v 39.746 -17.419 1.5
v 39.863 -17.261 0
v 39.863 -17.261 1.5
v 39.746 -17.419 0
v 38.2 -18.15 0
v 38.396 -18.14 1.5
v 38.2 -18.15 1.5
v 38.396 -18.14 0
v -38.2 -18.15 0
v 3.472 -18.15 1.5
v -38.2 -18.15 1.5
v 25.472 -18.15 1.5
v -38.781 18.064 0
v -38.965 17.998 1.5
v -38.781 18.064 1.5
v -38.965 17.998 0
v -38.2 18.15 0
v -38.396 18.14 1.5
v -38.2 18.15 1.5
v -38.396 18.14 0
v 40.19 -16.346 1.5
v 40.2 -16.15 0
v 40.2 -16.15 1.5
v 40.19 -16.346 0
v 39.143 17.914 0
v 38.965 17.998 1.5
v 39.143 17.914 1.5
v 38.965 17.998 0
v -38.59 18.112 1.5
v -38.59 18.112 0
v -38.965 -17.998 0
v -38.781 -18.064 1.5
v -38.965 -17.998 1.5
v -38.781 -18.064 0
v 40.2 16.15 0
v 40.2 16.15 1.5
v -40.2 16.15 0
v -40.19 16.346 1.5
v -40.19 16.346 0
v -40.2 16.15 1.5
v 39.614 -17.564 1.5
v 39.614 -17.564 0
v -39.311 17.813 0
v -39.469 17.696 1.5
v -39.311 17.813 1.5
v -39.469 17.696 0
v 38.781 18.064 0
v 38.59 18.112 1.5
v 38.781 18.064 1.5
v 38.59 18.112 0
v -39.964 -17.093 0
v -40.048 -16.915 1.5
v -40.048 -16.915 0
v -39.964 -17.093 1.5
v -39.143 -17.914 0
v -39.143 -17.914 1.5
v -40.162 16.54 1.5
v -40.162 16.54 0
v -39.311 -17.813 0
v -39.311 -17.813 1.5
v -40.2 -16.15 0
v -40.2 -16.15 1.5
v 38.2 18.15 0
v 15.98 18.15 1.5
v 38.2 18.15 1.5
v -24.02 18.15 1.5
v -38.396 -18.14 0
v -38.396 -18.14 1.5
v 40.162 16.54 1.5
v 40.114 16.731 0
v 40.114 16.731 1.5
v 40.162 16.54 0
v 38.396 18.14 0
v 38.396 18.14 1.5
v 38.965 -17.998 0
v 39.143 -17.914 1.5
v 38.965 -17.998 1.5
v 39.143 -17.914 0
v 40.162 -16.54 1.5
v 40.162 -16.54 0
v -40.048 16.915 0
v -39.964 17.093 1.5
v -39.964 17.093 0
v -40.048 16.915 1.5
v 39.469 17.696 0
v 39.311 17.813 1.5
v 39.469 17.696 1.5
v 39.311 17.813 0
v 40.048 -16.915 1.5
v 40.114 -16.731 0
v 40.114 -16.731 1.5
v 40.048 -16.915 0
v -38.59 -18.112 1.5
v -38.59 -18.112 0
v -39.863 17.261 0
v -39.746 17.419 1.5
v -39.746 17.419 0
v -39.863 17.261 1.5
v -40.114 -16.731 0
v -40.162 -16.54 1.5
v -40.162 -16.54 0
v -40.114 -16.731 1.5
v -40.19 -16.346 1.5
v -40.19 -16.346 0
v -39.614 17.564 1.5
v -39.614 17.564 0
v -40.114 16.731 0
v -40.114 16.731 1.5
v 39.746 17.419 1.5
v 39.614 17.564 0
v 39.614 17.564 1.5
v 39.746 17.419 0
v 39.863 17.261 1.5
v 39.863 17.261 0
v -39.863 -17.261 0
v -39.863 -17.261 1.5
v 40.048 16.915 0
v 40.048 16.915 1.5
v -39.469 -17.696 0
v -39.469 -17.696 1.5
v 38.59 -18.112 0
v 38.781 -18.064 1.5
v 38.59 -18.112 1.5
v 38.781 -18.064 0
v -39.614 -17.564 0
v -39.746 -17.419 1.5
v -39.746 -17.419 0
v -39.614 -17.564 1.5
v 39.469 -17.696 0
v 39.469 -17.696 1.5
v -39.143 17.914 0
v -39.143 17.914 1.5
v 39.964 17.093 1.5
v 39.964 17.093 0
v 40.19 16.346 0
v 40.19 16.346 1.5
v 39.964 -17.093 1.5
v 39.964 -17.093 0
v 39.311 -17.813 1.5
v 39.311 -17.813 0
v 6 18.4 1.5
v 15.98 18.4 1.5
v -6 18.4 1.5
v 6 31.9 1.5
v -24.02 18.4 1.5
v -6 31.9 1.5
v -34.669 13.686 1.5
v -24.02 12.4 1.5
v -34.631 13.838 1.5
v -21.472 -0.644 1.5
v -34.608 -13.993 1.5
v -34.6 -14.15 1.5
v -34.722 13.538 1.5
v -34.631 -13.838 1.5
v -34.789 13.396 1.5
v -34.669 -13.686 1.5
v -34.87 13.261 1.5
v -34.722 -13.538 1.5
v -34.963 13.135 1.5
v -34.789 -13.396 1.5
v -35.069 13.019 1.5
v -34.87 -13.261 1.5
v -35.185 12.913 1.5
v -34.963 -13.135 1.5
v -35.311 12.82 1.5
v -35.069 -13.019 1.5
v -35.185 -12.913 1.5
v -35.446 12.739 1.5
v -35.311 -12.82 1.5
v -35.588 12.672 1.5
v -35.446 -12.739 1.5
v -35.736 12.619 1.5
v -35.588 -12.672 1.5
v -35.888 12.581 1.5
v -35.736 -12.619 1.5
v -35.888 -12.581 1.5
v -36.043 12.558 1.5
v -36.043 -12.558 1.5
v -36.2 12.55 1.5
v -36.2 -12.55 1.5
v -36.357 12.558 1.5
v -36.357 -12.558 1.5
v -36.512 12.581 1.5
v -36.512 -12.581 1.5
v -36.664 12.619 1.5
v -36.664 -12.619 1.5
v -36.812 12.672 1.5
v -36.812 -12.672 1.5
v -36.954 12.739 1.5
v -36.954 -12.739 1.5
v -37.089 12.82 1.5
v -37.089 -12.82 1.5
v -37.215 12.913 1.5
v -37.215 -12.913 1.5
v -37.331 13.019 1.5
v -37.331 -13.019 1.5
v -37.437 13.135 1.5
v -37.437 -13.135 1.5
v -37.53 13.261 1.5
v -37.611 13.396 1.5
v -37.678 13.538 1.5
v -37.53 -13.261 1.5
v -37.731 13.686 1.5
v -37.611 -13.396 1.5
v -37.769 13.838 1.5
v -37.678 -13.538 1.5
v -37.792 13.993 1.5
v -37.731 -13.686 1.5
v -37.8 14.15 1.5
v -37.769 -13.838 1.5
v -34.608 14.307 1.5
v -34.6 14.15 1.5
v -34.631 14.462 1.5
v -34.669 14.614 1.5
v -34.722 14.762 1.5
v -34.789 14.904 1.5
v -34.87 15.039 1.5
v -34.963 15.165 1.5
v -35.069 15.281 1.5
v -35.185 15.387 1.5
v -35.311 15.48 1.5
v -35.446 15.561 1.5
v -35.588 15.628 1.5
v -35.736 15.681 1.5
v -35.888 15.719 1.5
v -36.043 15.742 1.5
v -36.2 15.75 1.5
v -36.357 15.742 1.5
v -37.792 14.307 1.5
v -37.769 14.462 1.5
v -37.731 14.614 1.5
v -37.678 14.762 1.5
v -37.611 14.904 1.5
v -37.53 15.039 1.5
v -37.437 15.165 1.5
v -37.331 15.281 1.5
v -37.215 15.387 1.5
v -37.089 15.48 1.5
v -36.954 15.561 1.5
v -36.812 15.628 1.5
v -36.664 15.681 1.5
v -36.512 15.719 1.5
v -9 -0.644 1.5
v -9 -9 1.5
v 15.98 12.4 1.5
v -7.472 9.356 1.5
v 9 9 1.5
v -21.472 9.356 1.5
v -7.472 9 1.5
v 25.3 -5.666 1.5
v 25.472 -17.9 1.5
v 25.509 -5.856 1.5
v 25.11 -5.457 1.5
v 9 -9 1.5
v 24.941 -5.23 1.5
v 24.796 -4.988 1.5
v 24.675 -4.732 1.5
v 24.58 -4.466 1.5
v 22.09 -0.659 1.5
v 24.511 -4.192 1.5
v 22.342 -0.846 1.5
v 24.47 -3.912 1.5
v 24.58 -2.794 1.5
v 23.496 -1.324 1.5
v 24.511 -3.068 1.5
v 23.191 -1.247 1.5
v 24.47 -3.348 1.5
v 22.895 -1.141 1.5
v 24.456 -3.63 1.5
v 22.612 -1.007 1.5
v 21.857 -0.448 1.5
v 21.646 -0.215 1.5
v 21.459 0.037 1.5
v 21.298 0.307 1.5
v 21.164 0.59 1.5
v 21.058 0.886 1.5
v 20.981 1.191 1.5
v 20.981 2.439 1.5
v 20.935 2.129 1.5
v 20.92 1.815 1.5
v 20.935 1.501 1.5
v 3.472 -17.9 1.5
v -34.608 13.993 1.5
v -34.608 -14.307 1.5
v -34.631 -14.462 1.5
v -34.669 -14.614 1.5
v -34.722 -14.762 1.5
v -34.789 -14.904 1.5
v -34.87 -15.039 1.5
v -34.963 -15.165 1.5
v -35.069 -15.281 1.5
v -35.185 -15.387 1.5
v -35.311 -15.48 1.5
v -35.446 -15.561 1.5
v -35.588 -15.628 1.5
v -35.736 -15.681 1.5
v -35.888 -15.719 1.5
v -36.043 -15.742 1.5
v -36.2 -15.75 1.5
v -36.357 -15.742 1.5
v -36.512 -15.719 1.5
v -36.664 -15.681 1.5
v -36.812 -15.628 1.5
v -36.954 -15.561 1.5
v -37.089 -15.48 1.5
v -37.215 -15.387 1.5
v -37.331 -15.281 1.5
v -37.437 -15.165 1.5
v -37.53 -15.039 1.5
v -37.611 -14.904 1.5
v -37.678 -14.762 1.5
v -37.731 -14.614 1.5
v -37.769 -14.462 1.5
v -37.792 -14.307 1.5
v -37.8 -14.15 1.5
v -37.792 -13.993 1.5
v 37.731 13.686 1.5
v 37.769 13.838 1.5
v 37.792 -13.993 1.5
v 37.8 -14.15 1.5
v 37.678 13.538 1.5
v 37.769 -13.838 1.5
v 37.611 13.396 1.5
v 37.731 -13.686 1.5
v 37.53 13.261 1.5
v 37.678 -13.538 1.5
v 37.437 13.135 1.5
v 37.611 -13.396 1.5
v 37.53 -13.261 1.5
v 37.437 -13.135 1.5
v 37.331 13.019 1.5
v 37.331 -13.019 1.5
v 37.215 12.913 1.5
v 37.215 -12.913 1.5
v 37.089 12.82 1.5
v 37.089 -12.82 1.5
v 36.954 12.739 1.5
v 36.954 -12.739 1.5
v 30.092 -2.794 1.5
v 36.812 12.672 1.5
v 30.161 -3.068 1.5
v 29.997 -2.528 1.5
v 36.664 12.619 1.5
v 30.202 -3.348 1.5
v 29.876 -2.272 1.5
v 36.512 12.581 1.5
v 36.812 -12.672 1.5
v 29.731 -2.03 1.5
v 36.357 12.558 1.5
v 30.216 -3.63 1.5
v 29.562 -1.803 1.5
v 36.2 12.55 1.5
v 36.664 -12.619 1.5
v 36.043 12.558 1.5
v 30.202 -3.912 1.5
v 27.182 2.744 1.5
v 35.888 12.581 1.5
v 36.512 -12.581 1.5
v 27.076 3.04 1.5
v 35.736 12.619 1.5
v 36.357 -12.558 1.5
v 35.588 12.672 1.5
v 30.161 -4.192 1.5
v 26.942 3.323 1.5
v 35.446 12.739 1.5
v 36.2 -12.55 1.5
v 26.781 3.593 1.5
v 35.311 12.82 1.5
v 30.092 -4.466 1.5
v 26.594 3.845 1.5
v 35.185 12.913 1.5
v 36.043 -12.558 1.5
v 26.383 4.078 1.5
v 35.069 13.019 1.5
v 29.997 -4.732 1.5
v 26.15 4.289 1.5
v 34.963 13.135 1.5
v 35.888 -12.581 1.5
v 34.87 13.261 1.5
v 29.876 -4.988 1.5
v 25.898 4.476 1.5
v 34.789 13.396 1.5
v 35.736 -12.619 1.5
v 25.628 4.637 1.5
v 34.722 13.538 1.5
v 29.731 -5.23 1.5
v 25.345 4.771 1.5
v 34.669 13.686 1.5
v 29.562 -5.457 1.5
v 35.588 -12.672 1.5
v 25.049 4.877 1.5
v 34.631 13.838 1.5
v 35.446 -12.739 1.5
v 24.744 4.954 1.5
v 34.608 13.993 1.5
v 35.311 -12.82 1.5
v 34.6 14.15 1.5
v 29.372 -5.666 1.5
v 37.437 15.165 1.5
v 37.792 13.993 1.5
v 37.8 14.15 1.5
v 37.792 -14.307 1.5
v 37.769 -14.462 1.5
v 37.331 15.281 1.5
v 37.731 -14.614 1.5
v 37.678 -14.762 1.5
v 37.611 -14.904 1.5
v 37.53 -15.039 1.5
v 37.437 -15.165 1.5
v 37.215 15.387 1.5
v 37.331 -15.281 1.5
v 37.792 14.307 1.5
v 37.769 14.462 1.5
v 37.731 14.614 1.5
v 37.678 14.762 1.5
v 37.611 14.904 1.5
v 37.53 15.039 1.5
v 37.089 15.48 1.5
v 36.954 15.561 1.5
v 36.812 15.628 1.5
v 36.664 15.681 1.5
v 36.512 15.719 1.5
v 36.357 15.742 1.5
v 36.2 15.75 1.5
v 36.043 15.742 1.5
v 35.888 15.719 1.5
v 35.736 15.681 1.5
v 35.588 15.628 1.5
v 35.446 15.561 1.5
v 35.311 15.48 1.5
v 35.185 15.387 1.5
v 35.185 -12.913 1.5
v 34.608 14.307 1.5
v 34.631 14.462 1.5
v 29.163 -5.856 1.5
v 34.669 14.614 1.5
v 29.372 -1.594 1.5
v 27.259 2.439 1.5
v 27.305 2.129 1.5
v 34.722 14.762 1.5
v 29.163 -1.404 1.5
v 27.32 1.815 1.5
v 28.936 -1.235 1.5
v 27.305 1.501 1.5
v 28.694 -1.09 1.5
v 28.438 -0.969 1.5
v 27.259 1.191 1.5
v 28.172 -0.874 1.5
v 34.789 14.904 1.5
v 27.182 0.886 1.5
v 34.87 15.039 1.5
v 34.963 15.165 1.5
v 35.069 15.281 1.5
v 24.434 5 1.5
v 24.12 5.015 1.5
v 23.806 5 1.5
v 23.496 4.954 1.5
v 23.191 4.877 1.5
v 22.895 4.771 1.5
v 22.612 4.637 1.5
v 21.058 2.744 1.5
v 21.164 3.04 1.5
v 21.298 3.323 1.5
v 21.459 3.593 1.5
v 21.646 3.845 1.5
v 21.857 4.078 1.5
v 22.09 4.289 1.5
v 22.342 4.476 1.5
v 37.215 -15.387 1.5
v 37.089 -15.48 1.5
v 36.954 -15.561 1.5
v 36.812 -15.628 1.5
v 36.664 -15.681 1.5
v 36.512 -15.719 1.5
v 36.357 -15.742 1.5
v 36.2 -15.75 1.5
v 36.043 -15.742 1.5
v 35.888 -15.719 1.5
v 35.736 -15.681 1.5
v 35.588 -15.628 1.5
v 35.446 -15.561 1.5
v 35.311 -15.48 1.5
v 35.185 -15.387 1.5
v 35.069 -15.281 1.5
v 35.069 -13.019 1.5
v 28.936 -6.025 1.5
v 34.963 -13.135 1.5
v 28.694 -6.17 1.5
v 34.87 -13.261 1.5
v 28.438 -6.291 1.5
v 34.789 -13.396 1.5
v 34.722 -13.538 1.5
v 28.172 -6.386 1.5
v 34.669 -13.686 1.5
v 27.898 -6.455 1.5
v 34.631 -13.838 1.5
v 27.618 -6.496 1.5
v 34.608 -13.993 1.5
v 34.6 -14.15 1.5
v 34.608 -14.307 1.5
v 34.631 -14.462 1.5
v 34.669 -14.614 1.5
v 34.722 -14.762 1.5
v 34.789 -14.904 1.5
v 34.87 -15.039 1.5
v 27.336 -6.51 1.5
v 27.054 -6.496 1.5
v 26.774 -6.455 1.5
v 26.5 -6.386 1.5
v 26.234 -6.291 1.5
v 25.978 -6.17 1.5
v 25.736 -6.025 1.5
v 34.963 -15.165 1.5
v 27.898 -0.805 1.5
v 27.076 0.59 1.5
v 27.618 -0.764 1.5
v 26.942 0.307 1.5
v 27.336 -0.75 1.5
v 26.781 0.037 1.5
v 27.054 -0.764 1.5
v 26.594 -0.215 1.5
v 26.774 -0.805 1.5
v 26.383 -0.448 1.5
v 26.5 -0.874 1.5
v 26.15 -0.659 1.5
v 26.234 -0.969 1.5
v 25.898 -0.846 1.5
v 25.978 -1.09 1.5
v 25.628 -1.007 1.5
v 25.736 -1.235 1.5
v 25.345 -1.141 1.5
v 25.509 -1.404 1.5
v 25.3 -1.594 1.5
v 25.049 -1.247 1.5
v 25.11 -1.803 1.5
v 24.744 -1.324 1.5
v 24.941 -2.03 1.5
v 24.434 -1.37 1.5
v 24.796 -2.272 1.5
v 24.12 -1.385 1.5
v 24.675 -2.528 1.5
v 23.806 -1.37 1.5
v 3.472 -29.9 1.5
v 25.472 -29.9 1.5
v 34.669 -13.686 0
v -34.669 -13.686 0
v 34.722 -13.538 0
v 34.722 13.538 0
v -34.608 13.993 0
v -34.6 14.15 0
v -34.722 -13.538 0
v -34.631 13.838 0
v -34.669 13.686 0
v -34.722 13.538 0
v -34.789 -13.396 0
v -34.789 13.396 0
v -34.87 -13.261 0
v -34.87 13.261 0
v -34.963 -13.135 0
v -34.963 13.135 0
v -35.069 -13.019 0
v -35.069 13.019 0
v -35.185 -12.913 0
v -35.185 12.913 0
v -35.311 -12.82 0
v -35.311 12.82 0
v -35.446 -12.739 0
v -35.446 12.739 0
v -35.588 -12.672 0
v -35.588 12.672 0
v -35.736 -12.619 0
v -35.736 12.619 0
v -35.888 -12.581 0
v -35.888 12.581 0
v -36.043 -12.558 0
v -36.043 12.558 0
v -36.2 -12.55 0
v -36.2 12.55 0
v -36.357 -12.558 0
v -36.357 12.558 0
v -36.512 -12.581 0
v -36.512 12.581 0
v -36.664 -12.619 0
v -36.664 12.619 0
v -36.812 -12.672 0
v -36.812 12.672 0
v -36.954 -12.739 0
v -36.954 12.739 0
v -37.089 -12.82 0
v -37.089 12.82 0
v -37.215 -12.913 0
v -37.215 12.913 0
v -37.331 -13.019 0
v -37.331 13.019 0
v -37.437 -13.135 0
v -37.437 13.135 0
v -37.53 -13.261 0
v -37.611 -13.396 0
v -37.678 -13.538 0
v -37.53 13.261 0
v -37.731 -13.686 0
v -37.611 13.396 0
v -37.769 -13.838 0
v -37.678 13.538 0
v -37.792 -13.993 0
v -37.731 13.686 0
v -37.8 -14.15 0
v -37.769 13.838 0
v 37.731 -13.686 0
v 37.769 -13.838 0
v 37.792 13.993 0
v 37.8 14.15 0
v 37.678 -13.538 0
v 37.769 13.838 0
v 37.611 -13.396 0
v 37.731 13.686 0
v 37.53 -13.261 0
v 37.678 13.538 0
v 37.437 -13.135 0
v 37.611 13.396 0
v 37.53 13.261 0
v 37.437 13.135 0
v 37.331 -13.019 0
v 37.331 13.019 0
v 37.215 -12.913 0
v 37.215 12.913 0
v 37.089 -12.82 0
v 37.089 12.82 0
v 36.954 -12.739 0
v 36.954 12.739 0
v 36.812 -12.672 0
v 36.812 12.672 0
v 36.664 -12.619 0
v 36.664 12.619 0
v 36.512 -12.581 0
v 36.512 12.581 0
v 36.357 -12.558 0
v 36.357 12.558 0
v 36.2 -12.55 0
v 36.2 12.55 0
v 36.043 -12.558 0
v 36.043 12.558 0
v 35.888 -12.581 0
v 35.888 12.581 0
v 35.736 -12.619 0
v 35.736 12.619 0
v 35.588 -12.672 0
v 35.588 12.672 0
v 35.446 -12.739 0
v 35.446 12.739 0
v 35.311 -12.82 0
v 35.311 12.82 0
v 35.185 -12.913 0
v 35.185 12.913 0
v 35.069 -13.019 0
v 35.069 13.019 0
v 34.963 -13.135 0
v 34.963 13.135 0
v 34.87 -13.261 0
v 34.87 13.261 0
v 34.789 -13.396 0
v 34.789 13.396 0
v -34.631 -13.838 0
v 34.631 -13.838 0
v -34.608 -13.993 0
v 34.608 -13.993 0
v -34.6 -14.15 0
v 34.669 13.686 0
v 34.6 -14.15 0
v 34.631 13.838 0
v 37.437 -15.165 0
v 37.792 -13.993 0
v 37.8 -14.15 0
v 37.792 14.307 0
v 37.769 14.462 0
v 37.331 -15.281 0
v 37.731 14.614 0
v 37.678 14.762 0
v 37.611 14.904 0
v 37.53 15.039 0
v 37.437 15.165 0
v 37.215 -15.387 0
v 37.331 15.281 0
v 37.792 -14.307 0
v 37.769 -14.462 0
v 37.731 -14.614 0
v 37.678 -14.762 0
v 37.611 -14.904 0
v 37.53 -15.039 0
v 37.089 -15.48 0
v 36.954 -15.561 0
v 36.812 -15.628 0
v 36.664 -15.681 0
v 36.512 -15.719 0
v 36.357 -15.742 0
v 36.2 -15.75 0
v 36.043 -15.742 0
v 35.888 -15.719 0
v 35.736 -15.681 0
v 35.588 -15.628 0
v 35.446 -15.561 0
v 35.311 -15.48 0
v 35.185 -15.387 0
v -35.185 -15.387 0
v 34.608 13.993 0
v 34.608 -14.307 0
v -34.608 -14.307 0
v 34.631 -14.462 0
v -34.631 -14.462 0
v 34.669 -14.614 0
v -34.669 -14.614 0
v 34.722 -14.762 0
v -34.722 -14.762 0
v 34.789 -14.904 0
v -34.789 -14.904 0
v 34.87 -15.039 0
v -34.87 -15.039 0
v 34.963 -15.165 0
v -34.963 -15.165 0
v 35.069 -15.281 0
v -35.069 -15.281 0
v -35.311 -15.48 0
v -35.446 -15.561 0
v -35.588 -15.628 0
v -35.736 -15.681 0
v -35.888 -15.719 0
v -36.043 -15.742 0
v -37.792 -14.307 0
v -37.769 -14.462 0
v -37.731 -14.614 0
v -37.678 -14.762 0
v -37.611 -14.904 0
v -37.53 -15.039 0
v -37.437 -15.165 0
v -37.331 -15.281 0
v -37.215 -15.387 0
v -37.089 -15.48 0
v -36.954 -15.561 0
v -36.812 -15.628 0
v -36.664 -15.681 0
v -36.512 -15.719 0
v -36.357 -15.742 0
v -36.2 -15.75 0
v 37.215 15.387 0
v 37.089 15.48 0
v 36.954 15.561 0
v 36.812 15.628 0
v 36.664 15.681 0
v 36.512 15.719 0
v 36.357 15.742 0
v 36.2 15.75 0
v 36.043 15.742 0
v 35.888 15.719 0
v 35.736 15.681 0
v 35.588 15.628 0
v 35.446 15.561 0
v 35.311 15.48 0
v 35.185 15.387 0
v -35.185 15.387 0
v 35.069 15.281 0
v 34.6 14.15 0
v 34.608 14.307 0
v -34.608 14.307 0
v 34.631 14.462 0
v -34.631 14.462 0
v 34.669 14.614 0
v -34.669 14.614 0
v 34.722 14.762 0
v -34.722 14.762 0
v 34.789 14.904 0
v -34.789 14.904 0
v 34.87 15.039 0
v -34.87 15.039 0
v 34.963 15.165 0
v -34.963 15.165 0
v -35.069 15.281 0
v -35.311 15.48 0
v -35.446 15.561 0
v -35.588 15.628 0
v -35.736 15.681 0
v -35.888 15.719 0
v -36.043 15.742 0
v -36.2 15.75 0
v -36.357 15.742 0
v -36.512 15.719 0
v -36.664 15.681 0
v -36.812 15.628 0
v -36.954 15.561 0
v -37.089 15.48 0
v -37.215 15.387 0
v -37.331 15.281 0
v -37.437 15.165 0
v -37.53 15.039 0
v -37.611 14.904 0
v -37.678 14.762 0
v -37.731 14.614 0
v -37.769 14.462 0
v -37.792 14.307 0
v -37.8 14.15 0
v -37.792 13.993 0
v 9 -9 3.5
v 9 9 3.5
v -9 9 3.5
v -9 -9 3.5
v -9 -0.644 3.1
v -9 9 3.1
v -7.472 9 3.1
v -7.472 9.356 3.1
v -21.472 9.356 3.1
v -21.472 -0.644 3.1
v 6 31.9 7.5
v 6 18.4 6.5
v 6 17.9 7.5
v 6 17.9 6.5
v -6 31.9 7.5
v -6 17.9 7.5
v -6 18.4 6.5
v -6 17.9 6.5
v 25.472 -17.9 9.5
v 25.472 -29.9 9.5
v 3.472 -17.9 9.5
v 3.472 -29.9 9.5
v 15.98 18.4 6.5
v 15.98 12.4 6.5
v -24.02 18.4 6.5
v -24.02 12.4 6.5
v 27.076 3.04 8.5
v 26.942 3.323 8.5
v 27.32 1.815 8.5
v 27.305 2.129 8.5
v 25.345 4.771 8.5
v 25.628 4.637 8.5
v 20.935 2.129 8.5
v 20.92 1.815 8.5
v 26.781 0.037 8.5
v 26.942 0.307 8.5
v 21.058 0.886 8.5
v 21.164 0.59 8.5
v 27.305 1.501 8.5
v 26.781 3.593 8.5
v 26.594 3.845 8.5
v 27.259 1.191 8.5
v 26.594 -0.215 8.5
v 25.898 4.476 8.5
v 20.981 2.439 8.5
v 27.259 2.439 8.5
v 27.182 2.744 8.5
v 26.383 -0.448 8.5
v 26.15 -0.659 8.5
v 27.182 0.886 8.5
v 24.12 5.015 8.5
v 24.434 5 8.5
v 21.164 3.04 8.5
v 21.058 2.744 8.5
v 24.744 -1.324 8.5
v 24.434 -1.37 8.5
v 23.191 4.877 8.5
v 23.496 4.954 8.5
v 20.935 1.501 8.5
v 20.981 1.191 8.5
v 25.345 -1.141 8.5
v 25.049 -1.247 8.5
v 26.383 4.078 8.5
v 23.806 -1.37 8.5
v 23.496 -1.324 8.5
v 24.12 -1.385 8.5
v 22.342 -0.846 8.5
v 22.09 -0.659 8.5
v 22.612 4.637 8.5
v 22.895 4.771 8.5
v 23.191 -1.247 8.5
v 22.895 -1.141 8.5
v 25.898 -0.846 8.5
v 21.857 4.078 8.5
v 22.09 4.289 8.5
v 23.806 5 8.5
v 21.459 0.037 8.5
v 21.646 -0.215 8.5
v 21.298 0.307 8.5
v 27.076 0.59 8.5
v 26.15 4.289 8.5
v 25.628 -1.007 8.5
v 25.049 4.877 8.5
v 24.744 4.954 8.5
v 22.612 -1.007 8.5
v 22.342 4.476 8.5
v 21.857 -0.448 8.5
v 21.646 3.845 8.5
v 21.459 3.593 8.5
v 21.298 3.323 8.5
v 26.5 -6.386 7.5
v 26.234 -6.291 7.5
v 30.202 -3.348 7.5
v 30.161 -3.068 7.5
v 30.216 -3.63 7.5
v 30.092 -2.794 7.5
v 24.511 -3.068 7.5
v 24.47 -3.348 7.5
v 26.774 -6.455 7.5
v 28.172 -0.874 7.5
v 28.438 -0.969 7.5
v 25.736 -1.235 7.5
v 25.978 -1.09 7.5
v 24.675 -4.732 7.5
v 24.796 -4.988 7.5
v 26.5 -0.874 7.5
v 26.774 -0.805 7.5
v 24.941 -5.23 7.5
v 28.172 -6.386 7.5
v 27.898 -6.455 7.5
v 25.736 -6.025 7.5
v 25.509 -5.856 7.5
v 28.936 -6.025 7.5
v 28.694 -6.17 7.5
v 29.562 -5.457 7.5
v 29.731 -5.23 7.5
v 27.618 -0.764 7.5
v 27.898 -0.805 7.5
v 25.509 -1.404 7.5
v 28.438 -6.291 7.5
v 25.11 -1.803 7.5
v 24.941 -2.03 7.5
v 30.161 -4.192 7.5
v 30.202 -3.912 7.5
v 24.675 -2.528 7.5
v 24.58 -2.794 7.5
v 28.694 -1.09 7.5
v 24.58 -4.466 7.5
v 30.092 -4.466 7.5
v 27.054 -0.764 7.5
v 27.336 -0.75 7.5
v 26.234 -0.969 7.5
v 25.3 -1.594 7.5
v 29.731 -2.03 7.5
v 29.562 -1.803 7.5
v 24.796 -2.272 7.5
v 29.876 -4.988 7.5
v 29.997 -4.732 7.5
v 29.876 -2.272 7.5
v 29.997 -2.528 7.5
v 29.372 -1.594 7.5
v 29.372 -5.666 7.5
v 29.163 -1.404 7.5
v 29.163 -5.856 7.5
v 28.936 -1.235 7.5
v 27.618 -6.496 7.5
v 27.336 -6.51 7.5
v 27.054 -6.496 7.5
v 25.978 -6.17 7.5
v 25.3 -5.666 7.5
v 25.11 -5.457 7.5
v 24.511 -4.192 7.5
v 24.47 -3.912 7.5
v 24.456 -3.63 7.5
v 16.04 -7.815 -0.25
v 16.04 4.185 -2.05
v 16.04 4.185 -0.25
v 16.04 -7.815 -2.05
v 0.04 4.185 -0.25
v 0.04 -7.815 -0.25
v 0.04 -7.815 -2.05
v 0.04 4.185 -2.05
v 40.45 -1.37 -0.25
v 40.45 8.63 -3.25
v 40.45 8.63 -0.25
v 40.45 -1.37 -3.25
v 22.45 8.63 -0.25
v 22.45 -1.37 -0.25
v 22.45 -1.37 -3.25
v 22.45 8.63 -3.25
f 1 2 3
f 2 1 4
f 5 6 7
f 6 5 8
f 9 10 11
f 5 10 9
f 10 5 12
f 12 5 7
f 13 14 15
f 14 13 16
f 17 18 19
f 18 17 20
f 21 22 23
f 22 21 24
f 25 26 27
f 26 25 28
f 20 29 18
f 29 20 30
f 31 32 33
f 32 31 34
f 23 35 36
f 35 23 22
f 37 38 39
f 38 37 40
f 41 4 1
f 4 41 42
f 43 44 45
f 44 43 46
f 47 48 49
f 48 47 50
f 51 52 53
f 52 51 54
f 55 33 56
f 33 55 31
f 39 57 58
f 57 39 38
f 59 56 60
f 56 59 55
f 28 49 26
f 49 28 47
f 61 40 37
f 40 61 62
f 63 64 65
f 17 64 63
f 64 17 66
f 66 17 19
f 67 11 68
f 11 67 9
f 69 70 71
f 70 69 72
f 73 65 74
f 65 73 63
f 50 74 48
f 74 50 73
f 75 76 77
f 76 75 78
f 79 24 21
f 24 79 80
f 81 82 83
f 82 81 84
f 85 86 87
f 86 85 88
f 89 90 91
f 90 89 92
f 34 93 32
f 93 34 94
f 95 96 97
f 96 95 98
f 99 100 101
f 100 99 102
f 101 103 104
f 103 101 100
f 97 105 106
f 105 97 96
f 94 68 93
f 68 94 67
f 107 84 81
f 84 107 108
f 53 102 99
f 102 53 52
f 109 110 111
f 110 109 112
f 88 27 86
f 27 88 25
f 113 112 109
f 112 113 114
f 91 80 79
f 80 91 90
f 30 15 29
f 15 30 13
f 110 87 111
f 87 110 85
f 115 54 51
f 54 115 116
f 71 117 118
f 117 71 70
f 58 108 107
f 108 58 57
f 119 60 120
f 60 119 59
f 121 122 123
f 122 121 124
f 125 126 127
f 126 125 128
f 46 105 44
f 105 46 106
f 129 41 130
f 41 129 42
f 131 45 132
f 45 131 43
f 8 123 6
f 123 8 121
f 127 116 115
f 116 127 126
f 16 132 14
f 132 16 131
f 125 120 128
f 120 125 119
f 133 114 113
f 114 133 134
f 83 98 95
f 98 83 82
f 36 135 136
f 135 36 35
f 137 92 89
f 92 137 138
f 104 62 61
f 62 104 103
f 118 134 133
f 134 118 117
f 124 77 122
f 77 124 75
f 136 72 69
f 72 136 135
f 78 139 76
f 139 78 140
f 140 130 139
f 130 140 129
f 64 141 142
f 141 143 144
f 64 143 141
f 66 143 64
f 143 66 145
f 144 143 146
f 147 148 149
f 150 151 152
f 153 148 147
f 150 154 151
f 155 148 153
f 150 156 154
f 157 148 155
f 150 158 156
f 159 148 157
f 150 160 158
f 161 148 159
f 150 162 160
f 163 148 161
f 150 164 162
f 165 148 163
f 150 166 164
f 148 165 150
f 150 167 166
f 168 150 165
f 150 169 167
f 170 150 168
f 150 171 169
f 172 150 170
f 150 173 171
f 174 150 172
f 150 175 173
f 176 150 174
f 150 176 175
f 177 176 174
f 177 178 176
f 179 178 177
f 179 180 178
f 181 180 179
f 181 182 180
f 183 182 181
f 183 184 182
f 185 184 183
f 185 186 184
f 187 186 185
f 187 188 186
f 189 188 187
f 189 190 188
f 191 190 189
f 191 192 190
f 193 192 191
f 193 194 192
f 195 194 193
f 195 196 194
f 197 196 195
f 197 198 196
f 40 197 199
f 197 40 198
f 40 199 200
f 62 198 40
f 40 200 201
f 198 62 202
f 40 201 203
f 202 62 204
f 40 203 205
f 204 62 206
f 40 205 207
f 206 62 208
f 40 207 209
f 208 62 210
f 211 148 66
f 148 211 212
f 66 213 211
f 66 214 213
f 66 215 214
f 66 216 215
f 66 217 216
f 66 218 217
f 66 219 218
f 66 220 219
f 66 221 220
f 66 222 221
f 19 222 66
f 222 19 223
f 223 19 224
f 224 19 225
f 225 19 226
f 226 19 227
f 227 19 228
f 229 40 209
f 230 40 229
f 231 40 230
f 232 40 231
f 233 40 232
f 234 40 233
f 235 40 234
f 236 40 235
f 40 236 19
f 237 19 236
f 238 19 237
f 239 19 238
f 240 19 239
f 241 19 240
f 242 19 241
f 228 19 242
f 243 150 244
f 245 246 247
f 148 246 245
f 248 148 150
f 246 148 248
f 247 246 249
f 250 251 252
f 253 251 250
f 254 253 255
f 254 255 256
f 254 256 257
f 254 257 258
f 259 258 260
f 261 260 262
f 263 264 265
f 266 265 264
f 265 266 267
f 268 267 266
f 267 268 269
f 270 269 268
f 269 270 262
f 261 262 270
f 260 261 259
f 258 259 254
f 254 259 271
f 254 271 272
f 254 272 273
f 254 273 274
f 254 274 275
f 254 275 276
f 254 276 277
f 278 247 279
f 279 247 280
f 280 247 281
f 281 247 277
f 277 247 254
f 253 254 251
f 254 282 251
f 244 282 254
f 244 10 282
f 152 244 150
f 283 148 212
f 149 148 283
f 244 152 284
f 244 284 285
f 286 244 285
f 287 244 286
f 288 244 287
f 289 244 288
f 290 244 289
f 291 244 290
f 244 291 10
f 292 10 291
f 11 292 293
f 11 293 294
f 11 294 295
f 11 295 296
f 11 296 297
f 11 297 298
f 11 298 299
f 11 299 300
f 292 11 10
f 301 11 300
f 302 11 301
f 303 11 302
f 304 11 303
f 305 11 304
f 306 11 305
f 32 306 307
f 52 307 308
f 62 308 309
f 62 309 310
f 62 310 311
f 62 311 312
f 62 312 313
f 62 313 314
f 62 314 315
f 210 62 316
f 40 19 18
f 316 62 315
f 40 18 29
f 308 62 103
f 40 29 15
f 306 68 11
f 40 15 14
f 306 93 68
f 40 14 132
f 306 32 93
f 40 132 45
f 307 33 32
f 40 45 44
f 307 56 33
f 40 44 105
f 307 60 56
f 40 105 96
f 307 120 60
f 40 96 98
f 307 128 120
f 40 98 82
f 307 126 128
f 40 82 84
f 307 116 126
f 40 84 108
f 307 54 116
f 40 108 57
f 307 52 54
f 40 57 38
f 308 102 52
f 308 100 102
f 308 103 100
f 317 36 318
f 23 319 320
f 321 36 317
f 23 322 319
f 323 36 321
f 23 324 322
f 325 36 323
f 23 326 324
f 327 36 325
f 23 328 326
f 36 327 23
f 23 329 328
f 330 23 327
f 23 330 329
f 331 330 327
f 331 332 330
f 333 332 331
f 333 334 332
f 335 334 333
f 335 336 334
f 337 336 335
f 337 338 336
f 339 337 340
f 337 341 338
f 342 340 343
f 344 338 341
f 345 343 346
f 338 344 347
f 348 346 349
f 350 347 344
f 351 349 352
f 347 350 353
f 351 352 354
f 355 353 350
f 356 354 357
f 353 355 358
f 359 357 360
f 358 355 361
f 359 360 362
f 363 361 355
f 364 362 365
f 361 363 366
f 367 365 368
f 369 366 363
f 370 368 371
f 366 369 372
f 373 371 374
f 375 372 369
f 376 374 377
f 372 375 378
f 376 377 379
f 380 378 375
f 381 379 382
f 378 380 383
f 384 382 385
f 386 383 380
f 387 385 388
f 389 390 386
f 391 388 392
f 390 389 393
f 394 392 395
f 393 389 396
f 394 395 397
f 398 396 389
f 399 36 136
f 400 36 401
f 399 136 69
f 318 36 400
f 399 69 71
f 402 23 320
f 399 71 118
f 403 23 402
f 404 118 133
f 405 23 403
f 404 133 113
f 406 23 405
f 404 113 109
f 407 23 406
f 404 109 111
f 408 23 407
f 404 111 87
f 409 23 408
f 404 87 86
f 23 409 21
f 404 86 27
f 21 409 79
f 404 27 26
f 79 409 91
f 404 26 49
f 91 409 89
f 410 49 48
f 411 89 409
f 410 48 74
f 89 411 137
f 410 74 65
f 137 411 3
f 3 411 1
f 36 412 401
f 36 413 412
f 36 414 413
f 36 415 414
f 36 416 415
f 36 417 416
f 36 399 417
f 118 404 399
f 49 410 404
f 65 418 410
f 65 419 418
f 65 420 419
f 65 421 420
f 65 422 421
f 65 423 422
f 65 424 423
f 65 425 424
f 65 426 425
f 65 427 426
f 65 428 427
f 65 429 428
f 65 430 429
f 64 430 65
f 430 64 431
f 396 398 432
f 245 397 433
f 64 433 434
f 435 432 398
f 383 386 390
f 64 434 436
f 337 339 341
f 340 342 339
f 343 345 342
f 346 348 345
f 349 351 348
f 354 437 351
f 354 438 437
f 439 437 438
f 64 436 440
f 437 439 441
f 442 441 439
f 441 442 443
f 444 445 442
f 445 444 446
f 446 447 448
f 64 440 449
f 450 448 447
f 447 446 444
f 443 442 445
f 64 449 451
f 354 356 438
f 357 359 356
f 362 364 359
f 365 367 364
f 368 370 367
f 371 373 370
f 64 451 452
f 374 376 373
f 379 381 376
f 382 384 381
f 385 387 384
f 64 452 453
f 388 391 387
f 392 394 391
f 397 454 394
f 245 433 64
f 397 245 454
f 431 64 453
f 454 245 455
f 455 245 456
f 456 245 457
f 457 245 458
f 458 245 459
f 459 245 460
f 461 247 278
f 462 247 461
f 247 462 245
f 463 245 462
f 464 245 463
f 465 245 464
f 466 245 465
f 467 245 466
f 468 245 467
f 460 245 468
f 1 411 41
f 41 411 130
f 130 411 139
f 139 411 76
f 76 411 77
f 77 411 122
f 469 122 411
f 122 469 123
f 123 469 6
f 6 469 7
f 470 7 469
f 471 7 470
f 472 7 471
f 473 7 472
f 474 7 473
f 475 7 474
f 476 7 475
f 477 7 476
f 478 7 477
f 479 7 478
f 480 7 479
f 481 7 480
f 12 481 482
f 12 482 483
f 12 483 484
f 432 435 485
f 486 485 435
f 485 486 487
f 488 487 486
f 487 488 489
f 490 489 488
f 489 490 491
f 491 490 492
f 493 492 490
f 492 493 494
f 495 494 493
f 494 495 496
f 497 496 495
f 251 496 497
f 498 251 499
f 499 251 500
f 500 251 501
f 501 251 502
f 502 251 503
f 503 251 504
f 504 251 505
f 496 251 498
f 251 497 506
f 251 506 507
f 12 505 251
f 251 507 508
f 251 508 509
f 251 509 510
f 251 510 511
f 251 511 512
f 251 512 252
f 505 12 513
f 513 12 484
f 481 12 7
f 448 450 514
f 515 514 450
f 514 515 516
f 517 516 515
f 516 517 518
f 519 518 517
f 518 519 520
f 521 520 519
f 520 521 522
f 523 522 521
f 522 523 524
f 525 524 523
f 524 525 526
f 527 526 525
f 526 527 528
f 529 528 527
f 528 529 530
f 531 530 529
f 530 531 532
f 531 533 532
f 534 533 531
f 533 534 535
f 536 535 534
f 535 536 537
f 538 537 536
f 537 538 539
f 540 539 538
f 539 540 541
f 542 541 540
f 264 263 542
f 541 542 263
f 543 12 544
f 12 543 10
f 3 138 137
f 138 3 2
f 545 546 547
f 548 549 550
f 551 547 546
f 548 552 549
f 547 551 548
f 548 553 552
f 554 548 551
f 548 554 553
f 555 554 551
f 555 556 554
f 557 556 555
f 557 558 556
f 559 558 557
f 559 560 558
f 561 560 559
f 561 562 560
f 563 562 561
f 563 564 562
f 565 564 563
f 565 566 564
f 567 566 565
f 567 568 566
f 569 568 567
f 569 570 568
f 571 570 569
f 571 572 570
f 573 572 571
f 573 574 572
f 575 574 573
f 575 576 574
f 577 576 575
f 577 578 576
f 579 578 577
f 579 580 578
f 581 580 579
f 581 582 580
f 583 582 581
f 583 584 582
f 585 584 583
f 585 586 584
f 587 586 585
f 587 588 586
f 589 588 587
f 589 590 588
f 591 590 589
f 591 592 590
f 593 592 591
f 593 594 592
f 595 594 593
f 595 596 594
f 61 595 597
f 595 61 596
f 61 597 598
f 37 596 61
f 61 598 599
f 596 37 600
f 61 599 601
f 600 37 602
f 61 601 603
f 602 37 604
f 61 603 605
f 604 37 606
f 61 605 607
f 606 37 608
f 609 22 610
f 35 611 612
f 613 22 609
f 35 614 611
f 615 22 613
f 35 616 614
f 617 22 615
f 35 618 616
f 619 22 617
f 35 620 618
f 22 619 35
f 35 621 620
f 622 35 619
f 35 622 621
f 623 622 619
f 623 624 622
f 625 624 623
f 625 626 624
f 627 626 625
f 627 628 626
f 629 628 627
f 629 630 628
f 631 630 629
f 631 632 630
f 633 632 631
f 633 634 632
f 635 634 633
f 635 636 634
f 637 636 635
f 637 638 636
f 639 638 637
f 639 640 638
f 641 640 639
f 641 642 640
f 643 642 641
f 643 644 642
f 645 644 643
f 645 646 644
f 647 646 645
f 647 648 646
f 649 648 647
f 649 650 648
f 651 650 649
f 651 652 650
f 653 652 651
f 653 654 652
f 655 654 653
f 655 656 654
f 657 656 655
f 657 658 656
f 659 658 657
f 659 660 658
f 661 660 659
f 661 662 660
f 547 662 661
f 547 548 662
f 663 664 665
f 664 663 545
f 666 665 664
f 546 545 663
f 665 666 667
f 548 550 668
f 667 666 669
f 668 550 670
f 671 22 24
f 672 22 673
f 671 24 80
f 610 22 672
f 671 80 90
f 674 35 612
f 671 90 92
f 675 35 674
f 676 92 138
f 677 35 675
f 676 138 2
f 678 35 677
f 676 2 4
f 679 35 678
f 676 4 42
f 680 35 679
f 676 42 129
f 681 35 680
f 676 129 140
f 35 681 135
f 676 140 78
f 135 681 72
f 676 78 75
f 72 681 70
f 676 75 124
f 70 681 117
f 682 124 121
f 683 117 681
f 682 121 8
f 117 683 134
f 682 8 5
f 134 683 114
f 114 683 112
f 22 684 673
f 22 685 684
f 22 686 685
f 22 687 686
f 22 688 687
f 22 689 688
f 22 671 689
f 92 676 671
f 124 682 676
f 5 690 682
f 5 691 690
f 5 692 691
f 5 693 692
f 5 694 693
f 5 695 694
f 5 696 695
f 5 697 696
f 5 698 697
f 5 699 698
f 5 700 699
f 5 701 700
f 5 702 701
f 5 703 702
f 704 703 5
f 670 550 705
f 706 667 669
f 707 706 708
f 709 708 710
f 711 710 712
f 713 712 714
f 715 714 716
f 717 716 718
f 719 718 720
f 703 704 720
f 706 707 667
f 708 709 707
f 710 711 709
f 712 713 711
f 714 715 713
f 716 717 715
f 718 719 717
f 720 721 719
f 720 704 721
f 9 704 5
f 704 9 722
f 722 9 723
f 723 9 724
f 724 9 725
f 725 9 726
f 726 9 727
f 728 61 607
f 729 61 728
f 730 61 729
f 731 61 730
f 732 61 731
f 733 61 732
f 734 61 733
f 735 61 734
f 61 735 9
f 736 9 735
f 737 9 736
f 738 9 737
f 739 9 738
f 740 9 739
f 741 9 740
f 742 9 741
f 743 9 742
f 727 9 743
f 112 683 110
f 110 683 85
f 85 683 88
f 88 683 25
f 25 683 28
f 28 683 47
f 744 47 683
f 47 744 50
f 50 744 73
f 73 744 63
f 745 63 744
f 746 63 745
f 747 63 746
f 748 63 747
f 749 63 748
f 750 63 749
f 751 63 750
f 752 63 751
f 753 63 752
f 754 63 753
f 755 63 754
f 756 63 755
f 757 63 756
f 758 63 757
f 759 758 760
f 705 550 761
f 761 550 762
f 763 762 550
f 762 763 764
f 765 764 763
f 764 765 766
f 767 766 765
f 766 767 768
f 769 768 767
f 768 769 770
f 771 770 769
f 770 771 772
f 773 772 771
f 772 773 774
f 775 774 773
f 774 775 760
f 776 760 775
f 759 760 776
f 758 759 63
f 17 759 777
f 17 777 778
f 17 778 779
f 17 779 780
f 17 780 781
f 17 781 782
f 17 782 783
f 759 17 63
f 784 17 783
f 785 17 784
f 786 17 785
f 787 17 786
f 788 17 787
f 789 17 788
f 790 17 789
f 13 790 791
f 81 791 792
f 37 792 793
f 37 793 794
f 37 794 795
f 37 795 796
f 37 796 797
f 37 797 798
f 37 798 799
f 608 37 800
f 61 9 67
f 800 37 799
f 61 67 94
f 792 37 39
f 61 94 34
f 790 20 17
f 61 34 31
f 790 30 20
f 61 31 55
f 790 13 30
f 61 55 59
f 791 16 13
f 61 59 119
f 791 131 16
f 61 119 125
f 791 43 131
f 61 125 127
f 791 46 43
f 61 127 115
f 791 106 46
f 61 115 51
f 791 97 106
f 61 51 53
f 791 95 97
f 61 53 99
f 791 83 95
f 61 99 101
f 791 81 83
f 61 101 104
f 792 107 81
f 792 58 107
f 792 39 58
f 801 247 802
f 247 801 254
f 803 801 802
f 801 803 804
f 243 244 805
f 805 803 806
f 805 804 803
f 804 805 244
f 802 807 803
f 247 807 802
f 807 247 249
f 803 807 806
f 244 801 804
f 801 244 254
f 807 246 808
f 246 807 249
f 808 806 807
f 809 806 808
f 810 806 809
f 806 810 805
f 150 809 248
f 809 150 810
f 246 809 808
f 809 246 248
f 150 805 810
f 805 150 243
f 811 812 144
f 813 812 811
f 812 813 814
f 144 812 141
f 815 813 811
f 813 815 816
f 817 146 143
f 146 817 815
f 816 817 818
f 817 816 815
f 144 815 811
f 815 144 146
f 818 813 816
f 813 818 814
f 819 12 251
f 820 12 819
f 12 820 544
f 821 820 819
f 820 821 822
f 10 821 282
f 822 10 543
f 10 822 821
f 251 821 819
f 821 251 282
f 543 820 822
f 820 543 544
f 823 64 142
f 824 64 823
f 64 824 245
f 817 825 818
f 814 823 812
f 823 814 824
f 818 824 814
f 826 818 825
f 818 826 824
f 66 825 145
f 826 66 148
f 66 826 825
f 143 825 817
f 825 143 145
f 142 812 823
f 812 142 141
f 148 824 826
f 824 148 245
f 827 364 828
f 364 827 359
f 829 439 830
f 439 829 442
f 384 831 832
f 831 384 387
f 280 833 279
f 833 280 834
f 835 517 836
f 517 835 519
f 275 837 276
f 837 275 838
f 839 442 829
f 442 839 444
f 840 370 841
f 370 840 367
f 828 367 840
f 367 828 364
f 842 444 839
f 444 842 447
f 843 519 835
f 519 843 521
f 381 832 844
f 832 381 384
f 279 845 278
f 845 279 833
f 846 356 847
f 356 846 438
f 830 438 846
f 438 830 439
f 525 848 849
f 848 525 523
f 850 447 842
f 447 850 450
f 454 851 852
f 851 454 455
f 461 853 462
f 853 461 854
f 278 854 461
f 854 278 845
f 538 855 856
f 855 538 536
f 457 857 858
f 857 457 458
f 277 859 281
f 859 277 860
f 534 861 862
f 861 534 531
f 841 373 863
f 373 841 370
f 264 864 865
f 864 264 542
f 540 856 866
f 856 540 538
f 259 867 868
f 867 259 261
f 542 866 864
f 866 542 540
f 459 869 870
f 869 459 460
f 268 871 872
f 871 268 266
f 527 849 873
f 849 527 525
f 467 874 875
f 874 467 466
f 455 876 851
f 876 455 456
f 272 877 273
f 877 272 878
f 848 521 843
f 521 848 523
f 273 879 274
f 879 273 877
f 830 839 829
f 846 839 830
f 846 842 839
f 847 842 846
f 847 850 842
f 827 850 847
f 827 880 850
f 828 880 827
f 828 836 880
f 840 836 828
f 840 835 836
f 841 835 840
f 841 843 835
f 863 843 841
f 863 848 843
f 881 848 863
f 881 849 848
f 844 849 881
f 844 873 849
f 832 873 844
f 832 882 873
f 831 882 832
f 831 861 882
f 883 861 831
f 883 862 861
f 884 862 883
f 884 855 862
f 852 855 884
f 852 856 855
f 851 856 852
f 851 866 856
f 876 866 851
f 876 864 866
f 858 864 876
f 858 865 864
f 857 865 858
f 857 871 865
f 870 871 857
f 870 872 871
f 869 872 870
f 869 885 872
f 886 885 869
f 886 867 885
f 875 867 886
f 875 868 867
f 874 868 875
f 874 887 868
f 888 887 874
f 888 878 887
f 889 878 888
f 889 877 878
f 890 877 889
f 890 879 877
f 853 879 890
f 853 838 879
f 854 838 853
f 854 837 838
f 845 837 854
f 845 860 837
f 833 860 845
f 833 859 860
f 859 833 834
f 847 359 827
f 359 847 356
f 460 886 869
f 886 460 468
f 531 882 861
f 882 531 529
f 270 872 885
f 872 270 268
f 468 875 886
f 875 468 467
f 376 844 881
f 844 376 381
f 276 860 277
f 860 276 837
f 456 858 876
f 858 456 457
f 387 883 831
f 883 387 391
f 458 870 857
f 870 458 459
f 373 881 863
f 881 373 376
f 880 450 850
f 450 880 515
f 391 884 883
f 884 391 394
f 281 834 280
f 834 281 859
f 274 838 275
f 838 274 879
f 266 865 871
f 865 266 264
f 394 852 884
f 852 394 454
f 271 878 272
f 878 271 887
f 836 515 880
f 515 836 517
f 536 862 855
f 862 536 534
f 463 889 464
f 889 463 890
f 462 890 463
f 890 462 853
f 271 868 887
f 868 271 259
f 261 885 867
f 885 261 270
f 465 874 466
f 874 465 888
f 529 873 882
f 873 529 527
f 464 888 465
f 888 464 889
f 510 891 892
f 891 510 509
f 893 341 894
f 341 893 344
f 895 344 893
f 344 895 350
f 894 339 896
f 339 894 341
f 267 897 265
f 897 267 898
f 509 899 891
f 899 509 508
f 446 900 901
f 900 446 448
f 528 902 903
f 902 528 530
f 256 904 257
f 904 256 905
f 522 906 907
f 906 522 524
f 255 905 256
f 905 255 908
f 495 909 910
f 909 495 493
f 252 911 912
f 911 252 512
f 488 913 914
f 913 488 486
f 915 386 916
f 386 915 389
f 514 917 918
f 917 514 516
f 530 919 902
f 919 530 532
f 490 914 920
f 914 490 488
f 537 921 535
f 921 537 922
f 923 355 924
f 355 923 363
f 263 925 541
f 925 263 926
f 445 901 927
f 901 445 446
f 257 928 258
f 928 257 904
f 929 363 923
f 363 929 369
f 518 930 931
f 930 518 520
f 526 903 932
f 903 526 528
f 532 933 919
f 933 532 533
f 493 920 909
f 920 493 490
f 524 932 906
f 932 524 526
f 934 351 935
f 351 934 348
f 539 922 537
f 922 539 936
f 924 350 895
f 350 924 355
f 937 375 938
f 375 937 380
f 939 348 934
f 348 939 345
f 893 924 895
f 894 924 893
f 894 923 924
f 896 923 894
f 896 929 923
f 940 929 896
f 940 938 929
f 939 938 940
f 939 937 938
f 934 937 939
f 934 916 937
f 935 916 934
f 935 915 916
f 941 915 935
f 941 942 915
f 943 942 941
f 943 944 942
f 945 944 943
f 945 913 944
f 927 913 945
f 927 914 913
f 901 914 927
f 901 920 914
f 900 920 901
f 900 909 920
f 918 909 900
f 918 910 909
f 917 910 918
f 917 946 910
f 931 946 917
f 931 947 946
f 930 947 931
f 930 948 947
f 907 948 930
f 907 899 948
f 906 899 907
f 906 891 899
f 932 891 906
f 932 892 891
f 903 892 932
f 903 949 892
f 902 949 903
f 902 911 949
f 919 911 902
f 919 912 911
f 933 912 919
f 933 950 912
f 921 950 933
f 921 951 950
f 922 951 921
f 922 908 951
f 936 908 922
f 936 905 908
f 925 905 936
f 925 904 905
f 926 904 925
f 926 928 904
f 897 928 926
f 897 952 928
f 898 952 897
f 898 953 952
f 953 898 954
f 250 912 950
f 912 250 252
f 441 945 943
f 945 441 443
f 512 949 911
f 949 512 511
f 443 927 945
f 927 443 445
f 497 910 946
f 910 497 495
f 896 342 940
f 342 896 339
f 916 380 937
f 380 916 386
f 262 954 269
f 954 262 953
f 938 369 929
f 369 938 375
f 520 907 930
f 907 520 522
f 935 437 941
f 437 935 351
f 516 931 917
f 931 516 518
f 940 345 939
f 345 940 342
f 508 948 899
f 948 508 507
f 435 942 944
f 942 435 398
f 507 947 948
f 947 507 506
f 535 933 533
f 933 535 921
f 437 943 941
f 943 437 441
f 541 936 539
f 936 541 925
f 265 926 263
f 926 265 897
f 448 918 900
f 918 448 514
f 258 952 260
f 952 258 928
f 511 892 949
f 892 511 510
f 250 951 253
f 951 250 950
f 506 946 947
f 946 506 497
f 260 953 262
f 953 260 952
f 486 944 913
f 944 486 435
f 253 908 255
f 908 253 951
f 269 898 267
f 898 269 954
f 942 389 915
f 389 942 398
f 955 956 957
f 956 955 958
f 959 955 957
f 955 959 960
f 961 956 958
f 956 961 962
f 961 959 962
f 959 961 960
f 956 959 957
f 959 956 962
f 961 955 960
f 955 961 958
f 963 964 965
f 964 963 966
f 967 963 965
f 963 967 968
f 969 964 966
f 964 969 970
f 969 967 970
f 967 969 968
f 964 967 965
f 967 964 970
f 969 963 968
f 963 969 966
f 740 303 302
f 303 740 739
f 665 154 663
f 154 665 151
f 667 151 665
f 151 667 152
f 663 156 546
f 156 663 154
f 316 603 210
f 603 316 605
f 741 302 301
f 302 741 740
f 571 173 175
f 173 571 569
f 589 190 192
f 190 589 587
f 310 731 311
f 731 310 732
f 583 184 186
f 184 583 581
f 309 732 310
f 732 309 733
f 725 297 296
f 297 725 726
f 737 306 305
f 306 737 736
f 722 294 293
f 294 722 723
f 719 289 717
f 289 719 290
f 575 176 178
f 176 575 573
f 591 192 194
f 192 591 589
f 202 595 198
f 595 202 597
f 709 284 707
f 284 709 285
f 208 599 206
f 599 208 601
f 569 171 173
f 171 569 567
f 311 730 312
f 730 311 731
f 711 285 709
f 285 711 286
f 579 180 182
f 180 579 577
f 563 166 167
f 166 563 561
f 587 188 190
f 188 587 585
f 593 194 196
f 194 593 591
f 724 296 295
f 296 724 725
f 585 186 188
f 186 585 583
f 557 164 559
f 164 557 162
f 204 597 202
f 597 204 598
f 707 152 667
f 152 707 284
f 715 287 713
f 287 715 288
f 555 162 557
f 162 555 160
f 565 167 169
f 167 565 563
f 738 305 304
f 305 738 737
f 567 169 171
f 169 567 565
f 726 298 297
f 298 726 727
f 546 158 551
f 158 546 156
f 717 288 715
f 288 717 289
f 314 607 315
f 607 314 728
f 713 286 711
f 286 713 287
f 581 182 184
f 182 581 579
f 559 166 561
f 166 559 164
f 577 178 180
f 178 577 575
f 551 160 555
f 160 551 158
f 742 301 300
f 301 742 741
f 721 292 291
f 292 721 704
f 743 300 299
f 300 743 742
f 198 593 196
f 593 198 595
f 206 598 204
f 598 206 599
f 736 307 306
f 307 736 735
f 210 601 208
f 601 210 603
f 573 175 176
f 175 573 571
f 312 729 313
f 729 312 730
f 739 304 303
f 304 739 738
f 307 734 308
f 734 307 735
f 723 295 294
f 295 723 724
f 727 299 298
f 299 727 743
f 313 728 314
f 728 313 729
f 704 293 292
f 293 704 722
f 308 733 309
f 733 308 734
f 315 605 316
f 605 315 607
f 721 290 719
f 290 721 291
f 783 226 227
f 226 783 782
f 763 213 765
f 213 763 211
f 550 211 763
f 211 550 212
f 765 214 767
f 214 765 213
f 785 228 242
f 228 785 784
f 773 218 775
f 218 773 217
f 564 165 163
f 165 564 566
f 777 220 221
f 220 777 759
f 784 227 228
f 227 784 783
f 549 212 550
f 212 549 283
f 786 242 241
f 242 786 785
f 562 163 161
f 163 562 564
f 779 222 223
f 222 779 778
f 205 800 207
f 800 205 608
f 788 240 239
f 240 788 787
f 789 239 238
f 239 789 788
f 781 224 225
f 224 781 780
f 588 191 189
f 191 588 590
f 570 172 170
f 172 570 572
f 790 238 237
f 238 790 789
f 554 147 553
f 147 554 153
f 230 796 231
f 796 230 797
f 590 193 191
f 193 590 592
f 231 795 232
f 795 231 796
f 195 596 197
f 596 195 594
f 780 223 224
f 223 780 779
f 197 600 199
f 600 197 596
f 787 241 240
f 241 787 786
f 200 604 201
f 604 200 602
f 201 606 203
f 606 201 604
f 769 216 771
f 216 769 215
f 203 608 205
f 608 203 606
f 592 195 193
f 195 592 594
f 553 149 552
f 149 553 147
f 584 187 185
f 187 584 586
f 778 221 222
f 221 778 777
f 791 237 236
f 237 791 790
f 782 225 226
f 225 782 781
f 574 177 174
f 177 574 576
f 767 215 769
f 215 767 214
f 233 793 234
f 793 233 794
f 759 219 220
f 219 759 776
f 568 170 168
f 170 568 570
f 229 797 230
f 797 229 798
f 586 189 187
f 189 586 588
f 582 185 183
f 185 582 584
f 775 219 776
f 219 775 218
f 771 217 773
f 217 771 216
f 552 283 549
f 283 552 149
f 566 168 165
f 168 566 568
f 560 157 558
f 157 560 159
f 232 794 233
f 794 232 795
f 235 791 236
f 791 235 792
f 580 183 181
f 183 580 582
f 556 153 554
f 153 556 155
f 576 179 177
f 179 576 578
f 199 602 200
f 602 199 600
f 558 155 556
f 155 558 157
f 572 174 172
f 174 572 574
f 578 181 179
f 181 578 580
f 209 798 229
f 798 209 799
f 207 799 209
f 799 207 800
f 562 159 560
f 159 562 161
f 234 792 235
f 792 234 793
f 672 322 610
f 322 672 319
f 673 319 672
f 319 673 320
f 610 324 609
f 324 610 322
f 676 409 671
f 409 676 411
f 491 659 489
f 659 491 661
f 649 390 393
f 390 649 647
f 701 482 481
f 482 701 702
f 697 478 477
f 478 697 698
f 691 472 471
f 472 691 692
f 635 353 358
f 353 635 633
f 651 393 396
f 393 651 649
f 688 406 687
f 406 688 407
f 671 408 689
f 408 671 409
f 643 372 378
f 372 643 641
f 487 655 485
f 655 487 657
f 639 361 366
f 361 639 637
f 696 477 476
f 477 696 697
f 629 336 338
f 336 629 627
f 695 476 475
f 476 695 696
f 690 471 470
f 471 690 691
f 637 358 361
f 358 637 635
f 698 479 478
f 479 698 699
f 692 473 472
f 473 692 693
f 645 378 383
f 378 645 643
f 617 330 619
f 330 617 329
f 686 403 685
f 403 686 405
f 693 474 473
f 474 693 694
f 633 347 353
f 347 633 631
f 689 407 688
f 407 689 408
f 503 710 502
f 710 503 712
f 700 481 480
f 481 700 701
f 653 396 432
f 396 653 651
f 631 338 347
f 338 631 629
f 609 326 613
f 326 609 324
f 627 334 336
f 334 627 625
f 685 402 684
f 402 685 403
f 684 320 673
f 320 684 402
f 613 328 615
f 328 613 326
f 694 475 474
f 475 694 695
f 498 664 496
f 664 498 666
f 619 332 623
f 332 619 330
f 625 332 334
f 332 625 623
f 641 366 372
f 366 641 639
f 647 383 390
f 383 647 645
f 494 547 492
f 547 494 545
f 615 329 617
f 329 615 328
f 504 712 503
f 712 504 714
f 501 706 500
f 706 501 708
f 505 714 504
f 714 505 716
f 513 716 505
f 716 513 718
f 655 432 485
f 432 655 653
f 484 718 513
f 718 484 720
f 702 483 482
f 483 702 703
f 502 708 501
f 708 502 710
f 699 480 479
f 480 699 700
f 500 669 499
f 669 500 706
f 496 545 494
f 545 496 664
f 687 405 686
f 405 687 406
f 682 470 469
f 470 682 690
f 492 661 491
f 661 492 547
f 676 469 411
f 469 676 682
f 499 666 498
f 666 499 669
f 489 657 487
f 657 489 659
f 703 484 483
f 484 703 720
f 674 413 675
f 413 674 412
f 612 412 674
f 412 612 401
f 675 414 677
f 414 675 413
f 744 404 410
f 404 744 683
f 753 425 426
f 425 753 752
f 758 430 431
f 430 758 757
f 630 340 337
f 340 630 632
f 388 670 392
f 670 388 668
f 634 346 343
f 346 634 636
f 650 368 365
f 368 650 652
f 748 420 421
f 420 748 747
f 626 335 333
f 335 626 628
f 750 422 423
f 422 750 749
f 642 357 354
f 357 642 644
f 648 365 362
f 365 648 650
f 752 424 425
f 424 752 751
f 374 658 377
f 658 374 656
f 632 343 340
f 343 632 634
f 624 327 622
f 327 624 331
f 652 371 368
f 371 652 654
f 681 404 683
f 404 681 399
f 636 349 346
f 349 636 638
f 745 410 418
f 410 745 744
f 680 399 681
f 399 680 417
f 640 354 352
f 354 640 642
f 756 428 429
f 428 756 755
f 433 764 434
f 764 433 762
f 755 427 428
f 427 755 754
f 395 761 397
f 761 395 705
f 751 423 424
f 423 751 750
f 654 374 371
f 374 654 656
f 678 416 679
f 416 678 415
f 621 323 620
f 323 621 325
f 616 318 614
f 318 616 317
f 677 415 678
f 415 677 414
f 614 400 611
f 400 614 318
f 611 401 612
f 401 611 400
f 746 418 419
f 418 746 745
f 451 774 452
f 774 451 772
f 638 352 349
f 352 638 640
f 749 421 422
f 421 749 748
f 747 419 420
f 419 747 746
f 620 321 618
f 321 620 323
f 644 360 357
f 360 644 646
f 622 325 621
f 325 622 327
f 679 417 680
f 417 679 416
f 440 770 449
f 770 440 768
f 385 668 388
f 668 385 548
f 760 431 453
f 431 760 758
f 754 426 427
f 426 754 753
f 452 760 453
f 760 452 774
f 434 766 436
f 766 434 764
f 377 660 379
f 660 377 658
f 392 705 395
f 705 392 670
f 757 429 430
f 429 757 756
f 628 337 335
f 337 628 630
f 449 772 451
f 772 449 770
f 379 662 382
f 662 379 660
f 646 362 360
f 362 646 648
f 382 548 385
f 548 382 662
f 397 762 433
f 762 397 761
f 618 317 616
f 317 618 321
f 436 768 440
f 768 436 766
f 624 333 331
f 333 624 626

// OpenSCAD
$fn = 64;

// Mainboard overall size (must match)
board_x  = 80.4;
board_y  = 36.3;
board_th = 1.5;

// Small modeling tolerances / overlaps to ensure ONE connected solid
eps = 0.25;          // overlap amount

// Board corner radius
corner_r = 2.0;

// Mounting holes (4-corner pattern, inset from edges)
hole_inset_x = 4.0;
hole_inset_y = 4.0;
hole_d       = 3.2;

// Helper: rounded rectangle prism (centered)
module rounded_plate(x, y, h, r) {
    linear_extrude(height=h, center=true)
        offset(r=r)
            square([x-2*r, y-2*r], center=true);
}

// Helper: mounting hole positions (centered coordinate system)
module hole_positions() {
    for (sx = [-1, 1], sy = [-1, 1])
        translate([sx*(board_x/2 - hole_inset_x), sy*(board_y/2 - hole_inset_y), 0])
            children();
}

difference() {
    // ONE connected solid: PCB + components unioned together
    union() {
        // PCB (flat 1.5mm)
        translate([0, 0, board_th/2])
            rounded_plate(board_x, board_y, board_th, corner_r);

        // --- Top-side components (all overlap into PCB by eps) ---
        z_top = board_th + eps;

        // Large MCU/driver chip
        chip1_x = 18;
        chip1_y = 18;
        chip1_h = 2.0;
        translate([0, 0, z_top + chip1_h/2 - eps])
            cube([chip1_x, chip1_y, chip1_h], center=true);

        // Smaller chip
        chip2_x = 14;
        chip2_y = 10;
        chip2_h = 1.6;
        translate([-(board_x*0.18), (board_y*0.12), z_top + chip2_h/2 - eps])
            cube([chip2_x, chip2_y, chip2_h], center=true);

        // USB connector on +Y edge (protrudes outward, overlaps into PCB)
        usb_x = 12;
        usb_y = 14;
        usb_h = 6.0;
        translate([0,
                   board_y/2 + usb_y/2 - eps,
                   z_top + usb_h/2 - eps])
            cube([usb_x, usb_y, usb_h], center=true);

        // Screw terminal block on -Y edge
        term_x = 22;
        term_y = 12;
        term_h = 8.0;
        translate([board_x*0.18,
                   -(board_y/2 + term_y/2 - eps),
                   z_top + term_h/2 - eps])
            cube([term_x, term_y, term_h], center=true);

        // Pin header along +Y long edge (sits on board, does not extend past edge)
        pin_x = 40;
        pin_y = 6;
        pin_h = 5.0;
        translate([-(board_x*0.05),
                   board_y/2 - pin_y/2 + eps,
                   z_top + pin_h/2 - eps])
            cube([pin_x, pin_y, pin_h], center=true);

        // Capacitors (cylinders)
        cap_r1 = 3.2;
        cap_h1 = 7.0;
        translate([board_x*0.30, board_y*0.05, z_top + cap_h1/2 - eps])
            cylinder(r=cap_r1, h=cap_h1, center=true);

        cap_r2 = cap_r1*0.9;
        cap_h2 = cap_h1-1;
        translate([board_x*0.34, -board_y*0.10, z_top + cap_h2/2 - eps])
            cylinder(r=cap_r2, h=cap_h2, center=true);

        // --- Bottom-side components (all overlap into PCB by eps) ---
        z_bot = -eps; // slightly into PCB from below

        // Bottom IC / driver
        bchip_x = 16;
        bchip_y = 12;
        bchip_h = 1.8;
        translate([board_x*0.10, -board_y*0.05, -(bchip_h/2) + z_bot])
            cube([bchip_x, bchip_y, bchip_h], center=true);

        // Bottom connector housing (e.g., SD/aux) near +X edge
        bconn_x = 18;
        bconn_y = 10;
        bconn_h = 3.0;
        translate([board_x/2 - bconn_x/2 + eps,
                   board_y*0.10,
                   -(bconn_h/2) + z_bot])
            cube([bconn_x, bconn_y, bconn_h], center=true);
    }

    // Mounting holes through PCB only (do not cut components)
    hole_positions()
        translate([0, 0, board_th/2])
            cylinder(d=hole_d, h=board_th + 2*eps, center=true);
}
